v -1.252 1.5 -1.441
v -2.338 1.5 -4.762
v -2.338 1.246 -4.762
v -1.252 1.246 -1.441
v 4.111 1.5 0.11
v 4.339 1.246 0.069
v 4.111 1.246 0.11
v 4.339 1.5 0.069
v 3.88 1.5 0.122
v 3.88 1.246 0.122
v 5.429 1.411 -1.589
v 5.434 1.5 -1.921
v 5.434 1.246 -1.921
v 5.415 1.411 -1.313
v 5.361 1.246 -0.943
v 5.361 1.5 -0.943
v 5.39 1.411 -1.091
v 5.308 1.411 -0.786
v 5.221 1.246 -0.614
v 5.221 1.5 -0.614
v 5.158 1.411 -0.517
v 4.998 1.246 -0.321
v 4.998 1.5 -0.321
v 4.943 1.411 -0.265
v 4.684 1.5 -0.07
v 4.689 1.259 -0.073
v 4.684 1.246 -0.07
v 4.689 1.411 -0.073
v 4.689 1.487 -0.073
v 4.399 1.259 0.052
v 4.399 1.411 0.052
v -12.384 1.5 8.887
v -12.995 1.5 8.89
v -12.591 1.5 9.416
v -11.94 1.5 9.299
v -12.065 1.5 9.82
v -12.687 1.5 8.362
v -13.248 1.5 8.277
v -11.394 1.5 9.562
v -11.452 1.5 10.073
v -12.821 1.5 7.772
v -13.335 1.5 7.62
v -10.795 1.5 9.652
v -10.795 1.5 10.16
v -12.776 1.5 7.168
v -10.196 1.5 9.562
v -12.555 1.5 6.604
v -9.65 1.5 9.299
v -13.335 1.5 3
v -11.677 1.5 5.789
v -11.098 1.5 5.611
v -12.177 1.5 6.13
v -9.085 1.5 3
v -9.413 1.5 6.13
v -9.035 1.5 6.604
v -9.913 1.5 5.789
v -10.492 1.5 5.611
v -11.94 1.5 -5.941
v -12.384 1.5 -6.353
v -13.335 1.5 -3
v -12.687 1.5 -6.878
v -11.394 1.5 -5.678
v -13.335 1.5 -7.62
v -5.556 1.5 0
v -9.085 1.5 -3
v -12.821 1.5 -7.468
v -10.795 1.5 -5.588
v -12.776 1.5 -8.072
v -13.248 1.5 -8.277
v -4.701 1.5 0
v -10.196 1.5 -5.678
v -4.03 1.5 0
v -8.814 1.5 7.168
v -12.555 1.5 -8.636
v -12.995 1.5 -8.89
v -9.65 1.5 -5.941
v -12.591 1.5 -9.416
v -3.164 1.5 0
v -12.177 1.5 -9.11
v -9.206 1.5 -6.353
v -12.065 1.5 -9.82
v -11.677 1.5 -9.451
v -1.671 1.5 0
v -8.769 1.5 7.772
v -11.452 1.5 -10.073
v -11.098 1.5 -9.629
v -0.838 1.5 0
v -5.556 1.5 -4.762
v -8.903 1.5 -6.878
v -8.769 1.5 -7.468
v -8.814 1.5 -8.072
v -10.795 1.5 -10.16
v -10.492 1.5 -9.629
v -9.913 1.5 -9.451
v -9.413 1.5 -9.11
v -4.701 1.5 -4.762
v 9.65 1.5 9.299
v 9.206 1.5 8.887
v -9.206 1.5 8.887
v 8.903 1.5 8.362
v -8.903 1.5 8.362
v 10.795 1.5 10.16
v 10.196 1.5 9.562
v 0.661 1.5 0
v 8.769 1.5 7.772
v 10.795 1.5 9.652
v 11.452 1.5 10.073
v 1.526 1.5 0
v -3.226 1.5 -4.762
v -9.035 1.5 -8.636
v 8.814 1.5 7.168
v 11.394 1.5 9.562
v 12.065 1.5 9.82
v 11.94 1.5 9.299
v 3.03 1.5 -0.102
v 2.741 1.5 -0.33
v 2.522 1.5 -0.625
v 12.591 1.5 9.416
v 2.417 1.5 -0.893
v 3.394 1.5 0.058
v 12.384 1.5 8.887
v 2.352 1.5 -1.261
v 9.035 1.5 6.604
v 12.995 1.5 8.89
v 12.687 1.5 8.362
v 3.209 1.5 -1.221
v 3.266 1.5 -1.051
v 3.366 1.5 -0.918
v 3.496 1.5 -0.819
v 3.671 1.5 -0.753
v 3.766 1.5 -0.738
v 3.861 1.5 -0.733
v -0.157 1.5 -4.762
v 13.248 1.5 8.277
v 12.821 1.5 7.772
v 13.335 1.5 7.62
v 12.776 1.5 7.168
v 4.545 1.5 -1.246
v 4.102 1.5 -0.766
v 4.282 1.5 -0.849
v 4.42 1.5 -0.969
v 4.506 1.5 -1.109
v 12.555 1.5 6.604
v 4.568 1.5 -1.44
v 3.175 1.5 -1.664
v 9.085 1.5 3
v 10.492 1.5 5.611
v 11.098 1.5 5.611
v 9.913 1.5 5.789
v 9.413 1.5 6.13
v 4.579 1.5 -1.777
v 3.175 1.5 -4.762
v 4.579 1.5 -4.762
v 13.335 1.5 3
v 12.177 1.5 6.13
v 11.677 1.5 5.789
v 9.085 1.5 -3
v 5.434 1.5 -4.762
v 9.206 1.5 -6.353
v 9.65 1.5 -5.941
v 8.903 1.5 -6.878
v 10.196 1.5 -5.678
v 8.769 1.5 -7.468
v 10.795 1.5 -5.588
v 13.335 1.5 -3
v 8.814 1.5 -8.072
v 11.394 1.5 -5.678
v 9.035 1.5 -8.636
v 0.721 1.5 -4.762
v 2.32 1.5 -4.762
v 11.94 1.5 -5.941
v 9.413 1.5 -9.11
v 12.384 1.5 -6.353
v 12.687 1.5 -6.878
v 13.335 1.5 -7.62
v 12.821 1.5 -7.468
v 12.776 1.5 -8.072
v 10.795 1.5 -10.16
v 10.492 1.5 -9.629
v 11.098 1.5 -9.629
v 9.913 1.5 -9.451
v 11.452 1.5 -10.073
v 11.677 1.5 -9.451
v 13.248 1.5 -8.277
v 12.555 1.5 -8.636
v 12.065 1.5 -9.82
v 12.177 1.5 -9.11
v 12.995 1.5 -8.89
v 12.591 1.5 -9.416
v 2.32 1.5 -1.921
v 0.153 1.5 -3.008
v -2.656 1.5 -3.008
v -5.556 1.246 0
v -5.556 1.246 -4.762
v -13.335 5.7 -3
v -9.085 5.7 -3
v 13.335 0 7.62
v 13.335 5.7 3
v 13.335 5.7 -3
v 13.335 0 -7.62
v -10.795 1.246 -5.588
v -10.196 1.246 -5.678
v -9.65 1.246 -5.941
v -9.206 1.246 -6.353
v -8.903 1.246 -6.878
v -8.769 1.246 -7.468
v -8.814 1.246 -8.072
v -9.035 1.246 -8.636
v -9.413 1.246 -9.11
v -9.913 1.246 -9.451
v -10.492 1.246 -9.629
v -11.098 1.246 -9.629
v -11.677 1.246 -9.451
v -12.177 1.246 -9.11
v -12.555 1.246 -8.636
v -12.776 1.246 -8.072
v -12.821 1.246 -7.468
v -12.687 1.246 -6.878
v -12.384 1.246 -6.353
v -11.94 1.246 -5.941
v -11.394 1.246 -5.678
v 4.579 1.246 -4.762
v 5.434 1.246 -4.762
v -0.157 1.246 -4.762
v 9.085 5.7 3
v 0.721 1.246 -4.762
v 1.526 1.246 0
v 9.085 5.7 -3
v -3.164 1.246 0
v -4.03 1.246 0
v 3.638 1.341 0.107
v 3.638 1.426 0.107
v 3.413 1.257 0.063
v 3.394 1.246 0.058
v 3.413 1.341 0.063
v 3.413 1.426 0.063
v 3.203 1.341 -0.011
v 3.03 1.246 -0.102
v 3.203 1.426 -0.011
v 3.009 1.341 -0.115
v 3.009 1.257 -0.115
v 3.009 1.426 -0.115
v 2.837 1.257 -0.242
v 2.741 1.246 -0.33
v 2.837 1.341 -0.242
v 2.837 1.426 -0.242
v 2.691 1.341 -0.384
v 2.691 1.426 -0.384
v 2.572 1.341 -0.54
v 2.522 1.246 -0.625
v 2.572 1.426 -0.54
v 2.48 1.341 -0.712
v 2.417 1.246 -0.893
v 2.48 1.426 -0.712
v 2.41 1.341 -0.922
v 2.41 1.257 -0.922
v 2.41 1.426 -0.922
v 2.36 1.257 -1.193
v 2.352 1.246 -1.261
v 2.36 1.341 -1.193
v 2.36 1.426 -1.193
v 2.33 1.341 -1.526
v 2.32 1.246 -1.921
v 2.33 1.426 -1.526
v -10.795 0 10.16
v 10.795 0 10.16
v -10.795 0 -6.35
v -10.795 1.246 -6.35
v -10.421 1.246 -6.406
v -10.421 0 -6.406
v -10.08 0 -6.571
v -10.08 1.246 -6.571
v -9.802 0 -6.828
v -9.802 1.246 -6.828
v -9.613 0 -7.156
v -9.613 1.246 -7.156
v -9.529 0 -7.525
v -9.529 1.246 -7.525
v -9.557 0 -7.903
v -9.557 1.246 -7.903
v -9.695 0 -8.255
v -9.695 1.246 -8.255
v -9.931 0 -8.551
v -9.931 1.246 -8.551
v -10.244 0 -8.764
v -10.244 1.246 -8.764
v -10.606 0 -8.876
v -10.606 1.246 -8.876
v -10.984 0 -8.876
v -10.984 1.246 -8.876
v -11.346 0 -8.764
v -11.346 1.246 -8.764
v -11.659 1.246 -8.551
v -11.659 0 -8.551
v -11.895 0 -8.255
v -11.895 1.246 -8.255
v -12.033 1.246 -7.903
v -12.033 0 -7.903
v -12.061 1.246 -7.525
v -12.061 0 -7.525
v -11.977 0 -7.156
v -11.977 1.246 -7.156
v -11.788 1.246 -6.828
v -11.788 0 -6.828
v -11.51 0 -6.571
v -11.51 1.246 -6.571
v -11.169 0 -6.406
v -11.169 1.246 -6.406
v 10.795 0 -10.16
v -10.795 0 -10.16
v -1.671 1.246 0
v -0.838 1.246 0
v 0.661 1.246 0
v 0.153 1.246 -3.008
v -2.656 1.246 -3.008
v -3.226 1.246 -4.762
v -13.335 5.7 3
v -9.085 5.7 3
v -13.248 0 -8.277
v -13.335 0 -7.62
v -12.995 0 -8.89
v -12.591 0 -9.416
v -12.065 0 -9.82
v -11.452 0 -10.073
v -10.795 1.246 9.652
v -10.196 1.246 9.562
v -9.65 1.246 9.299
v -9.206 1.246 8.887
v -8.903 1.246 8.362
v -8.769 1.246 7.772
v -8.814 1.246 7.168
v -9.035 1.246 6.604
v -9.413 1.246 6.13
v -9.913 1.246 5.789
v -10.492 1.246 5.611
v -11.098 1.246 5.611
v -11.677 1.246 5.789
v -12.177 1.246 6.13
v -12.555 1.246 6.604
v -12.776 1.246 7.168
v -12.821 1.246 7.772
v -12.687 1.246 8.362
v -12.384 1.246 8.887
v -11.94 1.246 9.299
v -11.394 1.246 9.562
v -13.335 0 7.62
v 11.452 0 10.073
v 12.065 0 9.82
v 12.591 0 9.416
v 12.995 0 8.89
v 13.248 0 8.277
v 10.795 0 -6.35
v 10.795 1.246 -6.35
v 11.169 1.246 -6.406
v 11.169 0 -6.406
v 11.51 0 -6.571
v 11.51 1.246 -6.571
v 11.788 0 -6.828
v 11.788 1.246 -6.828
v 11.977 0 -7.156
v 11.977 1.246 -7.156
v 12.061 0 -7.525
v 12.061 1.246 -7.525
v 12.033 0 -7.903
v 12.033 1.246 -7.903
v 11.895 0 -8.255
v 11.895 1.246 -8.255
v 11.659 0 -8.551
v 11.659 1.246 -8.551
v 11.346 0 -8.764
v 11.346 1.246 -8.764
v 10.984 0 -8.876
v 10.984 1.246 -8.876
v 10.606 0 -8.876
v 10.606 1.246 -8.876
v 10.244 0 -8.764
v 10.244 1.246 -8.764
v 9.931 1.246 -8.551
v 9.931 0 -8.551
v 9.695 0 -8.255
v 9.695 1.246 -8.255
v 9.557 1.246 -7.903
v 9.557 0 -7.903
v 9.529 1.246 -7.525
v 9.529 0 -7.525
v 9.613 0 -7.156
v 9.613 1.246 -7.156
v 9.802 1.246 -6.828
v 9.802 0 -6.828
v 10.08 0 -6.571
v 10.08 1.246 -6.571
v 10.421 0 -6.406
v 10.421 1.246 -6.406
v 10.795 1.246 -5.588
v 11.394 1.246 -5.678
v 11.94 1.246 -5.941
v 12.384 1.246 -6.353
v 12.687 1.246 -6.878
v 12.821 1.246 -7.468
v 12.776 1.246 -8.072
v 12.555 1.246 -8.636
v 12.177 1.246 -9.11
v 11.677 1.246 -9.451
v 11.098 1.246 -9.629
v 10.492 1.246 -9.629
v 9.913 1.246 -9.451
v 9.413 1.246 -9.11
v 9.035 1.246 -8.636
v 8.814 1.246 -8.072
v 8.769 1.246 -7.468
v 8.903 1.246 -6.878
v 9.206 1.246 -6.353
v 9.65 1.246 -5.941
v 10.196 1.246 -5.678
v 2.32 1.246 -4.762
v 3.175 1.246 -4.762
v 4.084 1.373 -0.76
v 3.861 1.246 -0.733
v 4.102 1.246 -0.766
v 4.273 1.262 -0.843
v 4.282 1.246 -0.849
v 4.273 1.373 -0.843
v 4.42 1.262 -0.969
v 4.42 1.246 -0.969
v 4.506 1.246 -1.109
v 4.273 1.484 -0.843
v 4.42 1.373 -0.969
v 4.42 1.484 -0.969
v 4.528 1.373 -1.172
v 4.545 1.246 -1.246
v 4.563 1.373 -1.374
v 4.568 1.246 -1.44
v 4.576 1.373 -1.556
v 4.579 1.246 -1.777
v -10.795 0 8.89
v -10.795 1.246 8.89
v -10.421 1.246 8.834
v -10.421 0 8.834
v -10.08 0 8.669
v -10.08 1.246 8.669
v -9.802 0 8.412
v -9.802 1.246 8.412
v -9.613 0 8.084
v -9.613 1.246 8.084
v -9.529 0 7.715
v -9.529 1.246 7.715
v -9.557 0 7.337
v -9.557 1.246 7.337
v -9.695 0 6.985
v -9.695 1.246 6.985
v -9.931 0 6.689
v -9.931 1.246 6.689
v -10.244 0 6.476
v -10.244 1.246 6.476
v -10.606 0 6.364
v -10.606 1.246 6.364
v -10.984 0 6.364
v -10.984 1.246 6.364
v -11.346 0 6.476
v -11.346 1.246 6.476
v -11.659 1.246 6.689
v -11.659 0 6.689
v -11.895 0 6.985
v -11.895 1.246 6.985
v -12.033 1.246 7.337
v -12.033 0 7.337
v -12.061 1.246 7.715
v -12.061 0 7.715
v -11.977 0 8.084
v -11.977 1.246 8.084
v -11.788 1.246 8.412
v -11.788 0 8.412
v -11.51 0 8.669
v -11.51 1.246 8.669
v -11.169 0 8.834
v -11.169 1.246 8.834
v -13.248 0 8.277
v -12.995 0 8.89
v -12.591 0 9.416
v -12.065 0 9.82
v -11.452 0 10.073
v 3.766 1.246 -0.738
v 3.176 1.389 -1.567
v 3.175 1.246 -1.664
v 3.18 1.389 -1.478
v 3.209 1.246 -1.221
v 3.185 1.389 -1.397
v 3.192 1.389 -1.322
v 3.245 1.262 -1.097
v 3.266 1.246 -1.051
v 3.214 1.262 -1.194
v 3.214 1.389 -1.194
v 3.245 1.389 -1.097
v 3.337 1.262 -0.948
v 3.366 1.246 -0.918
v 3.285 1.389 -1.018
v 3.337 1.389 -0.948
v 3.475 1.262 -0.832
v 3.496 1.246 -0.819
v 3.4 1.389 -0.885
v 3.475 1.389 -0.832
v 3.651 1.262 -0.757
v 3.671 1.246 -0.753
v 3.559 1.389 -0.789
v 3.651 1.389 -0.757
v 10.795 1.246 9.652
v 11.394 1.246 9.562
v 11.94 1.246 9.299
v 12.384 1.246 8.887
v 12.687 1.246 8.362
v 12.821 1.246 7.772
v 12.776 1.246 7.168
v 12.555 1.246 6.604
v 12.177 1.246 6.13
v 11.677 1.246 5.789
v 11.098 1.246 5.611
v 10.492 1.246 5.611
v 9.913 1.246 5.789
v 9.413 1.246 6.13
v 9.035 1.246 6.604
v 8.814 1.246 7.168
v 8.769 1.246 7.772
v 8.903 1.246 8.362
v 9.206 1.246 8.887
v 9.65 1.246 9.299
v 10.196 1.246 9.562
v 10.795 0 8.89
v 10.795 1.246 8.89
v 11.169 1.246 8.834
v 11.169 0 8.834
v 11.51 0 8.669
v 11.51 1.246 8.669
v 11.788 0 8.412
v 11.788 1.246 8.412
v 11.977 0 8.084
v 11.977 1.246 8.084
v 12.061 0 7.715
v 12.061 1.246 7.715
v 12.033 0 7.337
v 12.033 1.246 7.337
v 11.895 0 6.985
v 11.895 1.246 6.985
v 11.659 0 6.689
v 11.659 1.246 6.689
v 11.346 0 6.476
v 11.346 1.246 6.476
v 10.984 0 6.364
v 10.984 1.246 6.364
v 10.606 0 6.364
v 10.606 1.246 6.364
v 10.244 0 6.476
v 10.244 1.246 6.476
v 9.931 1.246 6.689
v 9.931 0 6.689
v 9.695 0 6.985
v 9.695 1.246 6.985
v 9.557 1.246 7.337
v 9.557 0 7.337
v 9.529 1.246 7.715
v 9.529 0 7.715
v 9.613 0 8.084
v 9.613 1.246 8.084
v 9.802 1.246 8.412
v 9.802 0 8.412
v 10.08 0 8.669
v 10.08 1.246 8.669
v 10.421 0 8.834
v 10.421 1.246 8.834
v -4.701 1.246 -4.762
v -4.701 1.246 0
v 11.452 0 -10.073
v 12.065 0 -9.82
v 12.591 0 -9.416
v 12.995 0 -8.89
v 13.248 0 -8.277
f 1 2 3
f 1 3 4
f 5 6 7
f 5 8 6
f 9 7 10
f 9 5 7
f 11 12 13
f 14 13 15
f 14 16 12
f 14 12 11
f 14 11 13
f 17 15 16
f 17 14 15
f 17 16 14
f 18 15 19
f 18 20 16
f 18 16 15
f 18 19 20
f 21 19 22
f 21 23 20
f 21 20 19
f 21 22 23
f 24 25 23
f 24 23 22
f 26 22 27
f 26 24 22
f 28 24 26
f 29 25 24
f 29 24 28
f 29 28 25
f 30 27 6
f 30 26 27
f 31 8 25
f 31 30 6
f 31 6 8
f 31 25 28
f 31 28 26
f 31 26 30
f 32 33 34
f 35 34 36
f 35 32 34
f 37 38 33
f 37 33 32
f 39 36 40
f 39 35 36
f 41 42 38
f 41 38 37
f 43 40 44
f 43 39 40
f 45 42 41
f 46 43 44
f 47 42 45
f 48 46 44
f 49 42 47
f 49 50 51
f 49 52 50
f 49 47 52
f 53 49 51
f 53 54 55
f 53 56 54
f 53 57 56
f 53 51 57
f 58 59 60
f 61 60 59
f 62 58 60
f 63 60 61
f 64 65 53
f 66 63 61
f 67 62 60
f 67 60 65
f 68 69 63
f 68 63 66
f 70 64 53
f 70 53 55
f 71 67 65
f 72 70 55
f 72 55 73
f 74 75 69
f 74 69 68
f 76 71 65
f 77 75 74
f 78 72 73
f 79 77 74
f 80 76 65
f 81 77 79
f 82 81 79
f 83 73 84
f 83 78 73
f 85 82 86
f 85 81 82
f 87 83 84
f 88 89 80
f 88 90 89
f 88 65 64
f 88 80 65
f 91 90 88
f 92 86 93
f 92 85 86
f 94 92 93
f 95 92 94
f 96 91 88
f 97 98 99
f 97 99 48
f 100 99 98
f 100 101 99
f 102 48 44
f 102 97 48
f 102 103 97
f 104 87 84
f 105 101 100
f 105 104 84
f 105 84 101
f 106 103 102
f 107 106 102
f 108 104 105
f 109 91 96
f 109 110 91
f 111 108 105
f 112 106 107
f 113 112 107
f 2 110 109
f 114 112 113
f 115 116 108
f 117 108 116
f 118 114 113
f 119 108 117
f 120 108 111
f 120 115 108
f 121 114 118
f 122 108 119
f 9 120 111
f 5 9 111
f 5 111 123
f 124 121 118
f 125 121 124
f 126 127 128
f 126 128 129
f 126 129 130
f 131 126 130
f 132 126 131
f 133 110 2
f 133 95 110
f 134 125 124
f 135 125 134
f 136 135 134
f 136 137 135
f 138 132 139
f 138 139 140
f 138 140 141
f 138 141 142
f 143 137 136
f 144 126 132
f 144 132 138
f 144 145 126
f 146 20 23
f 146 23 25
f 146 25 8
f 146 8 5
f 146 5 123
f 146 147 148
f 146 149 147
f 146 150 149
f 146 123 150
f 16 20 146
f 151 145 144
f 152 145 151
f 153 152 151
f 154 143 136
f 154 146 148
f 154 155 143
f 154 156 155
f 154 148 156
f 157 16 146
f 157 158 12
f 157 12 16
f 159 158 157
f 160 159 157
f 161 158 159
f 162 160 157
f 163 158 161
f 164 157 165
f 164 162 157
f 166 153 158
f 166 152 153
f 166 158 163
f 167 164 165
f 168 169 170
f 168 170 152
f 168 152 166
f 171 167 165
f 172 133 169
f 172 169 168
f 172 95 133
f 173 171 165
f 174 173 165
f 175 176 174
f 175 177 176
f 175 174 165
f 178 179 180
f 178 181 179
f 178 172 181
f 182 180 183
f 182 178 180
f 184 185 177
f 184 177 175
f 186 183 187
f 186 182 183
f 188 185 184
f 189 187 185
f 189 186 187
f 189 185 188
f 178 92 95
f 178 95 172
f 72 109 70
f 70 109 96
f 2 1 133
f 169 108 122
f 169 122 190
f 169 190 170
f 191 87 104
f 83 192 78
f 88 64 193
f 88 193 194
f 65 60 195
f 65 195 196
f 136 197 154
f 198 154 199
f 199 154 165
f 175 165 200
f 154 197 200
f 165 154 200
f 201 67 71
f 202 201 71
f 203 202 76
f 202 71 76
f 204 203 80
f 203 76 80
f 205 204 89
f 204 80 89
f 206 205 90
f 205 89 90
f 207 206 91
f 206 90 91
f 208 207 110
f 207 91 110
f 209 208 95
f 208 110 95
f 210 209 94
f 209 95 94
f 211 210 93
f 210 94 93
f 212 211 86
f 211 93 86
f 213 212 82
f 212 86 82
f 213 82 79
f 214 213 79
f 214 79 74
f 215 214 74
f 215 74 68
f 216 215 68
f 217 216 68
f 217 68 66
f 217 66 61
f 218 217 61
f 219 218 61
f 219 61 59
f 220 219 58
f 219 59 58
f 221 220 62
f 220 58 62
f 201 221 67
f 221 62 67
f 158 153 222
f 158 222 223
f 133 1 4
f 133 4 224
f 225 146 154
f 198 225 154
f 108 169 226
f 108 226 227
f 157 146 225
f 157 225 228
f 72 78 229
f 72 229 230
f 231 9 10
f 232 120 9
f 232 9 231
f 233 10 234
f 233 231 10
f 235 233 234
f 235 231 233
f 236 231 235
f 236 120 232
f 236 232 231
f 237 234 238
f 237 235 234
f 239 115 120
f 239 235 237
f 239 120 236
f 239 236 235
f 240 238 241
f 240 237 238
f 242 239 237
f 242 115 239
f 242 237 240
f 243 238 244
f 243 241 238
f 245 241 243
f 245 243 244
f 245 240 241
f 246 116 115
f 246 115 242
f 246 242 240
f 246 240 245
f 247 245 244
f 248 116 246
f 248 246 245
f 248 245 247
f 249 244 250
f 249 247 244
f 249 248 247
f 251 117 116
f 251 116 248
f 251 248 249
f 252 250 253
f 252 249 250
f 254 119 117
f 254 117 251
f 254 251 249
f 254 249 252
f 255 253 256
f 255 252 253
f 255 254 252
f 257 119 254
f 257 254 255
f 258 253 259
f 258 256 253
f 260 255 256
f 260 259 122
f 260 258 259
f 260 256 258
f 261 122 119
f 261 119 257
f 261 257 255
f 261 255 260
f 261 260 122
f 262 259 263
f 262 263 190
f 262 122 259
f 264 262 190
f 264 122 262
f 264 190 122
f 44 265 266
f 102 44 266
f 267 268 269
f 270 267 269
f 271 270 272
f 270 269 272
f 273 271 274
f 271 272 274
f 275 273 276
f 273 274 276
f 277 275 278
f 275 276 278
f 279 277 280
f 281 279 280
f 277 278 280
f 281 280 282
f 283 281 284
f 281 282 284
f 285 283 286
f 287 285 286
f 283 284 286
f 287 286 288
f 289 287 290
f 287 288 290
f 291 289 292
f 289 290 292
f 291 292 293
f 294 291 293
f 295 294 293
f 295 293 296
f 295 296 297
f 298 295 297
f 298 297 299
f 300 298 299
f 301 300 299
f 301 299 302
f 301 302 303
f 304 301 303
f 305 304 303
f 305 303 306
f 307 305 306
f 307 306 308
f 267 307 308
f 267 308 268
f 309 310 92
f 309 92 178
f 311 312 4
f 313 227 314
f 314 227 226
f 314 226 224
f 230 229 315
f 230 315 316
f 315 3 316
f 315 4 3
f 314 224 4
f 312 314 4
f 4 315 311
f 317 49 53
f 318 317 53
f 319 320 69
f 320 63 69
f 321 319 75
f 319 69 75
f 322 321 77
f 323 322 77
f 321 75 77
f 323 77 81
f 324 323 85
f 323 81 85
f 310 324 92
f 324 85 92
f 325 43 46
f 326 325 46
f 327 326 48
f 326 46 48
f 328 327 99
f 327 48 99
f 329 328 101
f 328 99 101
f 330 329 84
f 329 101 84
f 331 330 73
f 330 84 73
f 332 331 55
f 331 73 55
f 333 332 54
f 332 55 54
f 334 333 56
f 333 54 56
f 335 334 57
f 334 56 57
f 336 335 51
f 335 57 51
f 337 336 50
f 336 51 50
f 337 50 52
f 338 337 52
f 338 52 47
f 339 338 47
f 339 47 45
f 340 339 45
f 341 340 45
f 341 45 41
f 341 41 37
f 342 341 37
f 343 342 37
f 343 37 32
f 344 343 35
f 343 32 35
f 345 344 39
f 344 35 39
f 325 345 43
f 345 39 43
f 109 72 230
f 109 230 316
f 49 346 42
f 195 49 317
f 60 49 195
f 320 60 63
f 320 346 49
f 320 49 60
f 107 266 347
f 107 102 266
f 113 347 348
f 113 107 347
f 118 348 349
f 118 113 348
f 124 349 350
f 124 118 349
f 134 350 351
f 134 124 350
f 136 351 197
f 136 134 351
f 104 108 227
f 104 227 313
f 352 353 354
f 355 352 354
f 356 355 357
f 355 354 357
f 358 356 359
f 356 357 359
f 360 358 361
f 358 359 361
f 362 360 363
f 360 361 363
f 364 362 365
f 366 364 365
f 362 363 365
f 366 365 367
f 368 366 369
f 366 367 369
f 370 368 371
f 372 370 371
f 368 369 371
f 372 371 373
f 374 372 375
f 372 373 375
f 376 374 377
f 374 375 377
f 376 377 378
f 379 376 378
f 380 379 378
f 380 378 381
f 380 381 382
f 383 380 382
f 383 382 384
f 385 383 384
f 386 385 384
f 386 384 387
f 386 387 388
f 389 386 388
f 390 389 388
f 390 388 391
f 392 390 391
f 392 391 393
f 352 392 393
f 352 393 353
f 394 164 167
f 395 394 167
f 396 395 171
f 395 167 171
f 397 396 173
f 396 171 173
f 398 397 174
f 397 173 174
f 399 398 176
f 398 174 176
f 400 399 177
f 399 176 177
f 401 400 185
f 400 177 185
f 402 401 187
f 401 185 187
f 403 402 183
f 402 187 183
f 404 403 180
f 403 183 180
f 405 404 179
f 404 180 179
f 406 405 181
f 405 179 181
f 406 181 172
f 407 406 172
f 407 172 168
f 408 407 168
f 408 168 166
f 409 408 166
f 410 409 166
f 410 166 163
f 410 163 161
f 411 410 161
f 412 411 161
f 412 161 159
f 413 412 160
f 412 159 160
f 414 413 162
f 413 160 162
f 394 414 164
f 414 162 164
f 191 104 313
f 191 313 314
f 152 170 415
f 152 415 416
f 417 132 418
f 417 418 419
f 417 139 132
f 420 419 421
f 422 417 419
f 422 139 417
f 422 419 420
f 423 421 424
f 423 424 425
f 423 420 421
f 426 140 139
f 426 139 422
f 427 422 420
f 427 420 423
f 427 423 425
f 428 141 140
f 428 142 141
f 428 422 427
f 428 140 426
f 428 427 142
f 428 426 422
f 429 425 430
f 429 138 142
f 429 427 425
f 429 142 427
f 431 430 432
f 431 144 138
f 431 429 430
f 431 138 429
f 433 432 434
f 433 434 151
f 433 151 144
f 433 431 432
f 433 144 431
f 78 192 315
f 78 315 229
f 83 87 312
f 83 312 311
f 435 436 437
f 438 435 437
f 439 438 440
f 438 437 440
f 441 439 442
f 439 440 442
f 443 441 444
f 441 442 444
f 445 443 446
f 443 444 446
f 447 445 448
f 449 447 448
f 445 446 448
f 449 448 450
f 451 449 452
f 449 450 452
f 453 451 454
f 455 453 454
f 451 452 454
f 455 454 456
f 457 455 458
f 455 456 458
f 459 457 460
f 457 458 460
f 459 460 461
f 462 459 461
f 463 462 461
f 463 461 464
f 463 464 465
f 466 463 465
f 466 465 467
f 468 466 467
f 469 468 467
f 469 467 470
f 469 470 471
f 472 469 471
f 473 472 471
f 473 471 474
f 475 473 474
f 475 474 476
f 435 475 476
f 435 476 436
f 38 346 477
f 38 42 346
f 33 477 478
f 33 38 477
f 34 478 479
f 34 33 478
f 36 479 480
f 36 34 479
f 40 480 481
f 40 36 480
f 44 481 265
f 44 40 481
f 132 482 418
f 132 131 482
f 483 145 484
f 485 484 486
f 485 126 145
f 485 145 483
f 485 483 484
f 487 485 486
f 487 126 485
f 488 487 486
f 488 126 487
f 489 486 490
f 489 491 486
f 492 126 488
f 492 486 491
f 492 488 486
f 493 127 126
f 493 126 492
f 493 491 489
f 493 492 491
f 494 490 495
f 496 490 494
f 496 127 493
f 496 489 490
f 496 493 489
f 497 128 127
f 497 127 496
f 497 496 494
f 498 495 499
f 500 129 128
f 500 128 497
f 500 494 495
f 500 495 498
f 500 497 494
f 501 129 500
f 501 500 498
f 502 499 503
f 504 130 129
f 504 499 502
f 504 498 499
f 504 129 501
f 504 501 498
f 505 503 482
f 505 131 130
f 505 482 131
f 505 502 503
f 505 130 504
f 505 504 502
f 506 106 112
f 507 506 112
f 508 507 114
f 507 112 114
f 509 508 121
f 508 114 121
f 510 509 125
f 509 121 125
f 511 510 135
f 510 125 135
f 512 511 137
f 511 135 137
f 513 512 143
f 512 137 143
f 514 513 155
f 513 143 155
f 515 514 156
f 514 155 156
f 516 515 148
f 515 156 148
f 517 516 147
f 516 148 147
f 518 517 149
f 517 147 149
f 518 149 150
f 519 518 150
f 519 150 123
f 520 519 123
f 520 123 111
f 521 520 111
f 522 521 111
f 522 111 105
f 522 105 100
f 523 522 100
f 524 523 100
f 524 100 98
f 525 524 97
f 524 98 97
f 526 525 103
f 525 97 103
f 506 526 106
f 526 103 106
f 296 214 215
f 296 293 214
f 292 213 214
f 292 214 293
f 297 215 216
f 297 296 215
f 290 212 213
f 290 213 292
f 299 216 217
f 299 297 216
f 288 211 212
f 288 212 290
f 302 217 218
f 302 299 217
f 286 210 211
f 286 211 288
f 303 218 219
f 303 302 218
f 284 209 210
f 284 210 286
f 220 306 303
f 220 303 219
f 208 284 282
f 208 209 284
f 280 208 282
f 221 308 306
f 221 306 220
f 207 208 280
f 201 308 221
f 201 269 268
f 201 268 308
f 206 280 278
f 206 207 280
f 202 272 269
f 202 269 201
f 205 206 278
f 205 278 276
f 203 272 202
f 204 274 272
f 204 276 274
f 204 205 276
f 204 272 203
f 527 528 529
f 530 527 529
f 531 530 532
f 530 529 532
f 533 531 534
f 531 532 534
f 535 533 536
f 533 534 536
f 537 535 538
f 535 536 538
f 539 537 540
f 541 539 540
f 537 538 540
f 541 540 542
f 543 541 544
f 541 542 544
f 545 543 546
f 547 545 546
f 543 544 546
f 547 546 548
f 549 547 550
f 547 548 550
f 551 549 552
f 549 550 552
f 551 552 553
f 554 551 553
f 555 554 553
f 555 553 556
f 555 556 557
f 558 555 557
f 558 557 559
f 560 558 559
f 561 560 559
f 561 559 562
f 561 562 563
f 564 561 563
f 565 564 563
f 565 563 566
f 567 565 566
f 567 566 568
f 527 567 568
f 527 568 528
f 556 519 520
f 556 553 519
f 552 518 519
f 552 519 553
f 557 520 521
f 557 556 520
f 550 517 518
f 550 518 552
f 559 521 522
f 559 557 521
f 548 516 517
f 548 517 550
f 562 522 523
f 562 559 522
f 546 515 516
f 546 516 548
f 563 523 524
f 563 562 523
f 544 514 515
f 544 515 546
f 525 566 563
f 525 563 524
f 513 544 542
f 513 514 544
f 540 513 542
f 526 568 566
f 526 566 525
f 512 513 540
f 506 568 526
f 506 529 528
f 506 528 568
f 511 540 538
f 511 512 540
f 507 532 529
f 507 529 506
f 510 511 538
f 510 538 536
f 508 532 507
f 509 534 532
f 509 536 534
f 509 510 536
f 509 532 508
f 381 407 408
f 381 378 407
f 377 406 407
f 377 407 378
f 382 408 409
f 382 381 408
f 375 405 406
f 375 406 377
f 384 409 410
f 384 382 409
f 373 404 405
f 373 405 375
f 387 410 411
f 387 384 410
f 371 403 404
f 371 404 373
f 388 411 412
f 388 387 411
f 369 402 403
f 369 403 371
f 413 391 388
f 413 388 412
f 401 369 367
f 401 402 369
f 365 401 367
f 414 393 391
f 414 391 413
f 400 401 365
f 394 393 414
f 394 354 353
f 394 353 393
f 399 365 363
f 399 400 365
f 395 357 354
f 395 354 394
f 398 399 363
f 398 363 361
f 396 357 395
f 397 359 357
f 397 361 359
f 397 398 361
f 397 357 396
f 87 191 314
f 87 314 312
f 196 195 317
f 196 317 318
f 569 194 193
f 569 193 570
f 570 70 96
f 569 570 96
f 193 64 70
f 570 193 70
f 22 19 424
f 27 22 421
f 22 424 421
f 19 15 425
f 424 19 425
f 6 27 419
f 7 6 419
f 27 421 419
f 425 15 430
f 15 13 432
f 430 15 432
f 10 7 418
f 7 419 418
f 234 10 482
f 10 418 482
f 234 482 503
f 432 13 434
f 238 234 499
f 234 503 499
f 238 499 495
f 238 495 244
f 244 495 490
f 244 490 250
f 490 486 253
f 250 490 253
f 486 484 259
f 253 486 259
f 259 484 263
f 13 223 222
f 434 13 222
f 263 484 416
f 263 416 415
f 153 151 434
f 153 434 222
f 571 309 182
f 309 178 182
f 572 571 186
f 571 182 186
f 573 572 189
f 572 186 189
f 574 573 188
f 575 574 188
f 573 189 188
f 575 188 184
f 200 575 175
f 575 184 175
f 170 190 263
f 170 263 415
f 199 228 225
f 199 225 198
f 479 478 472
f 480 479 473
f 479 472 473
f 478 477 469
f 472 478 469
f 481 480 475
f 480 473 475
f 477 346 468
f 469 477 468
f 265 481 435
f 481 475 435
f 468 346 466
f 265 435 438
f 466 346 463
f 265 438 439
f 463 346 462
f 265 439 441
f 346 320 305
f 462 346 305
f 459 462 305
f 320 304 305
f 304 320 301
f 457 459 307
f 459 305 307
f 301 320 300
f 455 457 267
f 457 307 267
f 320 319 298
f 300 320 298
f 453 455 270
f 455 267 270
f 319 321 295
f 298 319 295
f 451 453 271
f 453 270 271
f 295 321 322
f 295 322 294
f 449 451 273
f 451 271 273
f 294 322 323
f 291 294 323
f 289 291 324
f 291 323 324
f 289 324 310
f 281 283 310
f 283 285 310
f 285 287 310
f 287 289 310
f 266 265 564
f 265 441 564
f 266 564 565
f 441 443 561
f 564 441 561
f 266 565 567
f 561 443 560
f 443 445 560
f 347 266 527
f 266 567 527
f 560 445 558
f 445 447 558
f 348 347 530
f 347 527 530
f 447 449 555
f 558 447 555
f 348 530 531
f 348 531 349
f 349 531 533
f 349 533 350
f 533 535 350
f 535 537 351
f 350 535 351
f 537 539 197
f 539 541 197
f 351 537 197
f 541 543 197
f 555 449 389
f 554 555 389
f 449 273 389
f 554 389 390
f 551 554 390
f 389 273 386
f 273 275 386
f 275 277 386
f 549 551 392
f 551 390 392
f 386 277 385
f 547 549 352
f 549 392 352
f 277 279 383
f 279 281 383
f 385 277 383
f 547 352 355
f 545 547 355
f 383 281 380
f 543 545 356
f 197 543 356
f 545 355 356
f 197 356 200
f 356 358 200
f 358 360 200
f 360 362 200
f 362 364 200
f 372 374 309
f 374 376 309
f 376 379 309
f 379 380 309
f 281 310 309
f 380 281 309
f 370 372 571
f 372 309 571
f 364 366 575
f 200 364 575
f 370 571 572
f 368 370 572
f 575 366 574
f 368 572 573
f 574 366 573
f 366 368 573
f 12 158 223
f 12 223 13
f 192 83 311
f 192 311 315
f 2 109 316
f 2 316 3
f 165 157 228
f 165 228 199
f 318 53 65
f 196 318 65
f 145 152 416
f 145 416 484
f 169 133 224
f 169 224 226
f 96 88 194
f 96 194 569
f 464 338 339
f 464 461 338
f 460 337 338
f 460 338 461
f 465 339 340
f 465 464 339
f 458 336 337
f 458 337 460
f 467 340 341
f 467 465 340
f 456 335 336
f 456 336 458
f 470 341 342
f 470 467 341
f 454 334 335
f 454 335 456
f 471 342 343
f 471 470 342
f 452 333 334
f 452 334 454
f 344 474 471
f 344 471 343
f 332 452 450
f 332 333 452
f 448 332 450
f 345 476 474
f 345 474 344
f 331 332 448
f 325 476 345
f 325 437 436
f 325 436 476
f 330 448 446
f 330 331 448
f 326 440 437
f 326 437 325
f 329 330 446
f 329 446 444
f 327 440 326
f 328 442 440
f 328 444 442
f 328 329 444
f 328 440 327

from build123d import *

# Parameters (mm, degrees)
SKETCH1_W           = 26.67
SKETCH1_H           = 20.32
BOSS_EXTRUDE1_DEPTH = 1.5
SKETCH2_R           = 1.27
CUT_EXTRUDE1_DEPTH  = 17.831453443
FILLET1_R           = 2.54
SKETCH3_W           = 0.854807692
SKETCH3_H           = 4.7625
CUT_EXTRUDE2_DEPTH  = 0.254
SKETCH4_R           = 2.032
SKETCH4_R_2         = 1.27
CUT_EXTRUDE3_DEPTH  = 0.254
SKETCH5_W           = 4.25
SKETCH5_H           = 6
BOSS_EXTRUDE3_DEPTH = 4.2


with BuildPart() as part:
    # Sketch1 → Boss-Extrude1 (new body)
    with BuildSketch(Plane(origin=(0, 0, 0), x_dir=(1, 0, 0), z_dir=(0, 1, 0))):
        Rectangle(SKETCH1_W, SKETCH1_H)
    extrude(amount=BOSS_EXTRUDE1_DEPTH)

    # Sketch2 → Cut-Extrude1 (cut, through all)
    with BuildSketch(Plane(origin=(0, 1.5, 0), x_dir=(1, 0, 0), z_dir=(0, 1, 0))):
        with Locations(Location((10.795, 7.62, 0), (0, 0, 270))):
            Circle(SKETCH2_R)
        with Locations(Location((-10.795, 7.62, 0), (0, 0, 270))):
            Circle(SKETCH2_R)
        with Locations(Location((-10.795, -7.62, 0), (0, 0, 270))):
            Circle(SKETCH2_R)
        with Locations(Location((10.795, -7.62, 0), (0, 0, 270))):
            Circle(SKETCH2_R)
    extrude(amount=-CUT_EXTRUDE1_DEPTH, mode=Mode.SUBTRACT)

    # Fillet1
    fillet1_edges = [part.edges().sort_by_distance(p)[0] for p in [
        (13.335, 0.75, 10.16),
        (-13.335, 0.75, 10.16),
        (-13.335, 0.75, -10.16),
        (13.335, 0.75, -10.16),
    ]]
    fillet(fillet1_edges, radius=FILLET1_R)

    # Sketch3 → Cut-Extrude2 (cut)
    with BuildSketch(Plane(origin=(0, 1.5, 0), x_dir=(1, 0, 0), z_dir=(0, 1, 0))):
        with Locations((-5.128846154, 2.38125)):
            Rectangle(SKETCH3_W, SKETCH3_H)
        Polygon((-3.225563401, 4.7625), (-2.33831881, 4.7625), (-1.251682692, 1.440579928), (-0.157414363, 4.7625), (0.72124399, 4.7625), (1.526442308, 0), (0.661140325, 0), (0.152644231, 3.008045373), (-0.837635216, 0), (-1.671454327, 0), (-2.656009615, 3.008045373), (-3.163551683, 0), (-4.029807692, 0), align=None)
        with BuildLine():
            Line((2.320192308, 4.7625), (3.175, 4.7625))
            Line((3.175, 4.7625), (3.175, 1.663822115))
            add(Edge.make_bspline(
                [(3.175, 1.663822115), (3.17504648, 1.631696367), (3.175136256, 1.569645816), (3.179630493, 1.480623591), (3.18374303, 1.398793527), (3.191163214, 1.32424521), (3.202125369, 1.256946752), (3.212740313, 1.19646585), (3.227106588, 1.143885348), (3.248696804, 1.08403497), (3.281960239, 1.016789802), (3.336310846, 0.946705344), (3.399026797, 0.882743105), (3.474195476, 0.82950336), (3.558678424, 0.786437205), (3.652011444, 0.75452995), (3.75406297, 0.736793753), (3.824626003, 0.734085998), (3.860945012, 0.732692308)],
                knots=[0, 0, 0, 0, 1.155499968, 2.231836252, 3.205919964, 4.102923608, 4.924856345, 5.658536265, 6.31071849, 6.882491295, 7.94666036, 8.992281882, 10.060072772, 11.158554251, 12.289267114, 13.461410017, 14.693379945, 16, 16, 16, 16], degree=3))
            add(Edge.make_bspline(
                [(3.860945012, 0.732692308), (3.899529477, 0.73381823), (3.974762653, 0.736013589), (4.082973598, 0.757563409), (4.183231653, 0.791878102), (4.273414012, 0.840853915), (4.353430929, 0.89956001), (4.421163572, 0.966503355), (4.474617926, 1.041817469), (4.509457485, 1.111300474), (4.529018182, 1.17525353), (4.543679898, 1.232393158), (4.554428558, 1.299812263), (4.564180096, 1.376457951), (4.570040019, 1.463124123), (4.57639415, 1.559113798), (4.578722998, 1.665083764), (4.579119934, 1.73887264), (4.579326923, 1.777351262)],
                knots=[0, 0, 0, 0, 1.261321664, 2.459363699, 3.594844139, 4.716940403, 5.803436589, 6.833651888, 7.818396249, 8.814403945, 9.360733334, 10.004355033, 10.743453831, 11.592799886, 12.532235708, 13.585170094, 14.740740724, 16, 16, 16, 16], degree=3))
            Line((4.579326923, 1.777351262), (4.579326923, 4.7625))
            Line((4.579326923, 4.7625), (5.434134615, 4.7625))
            Line((5.434134615, 4.7625), (5.434134615, 1.921409255))
            add(Edge.make_bspline(
                [(5.434134615, 1.921409255), (5.43401591, 1.863848892), (5.433787651, 1.753165928), (5.430282276, 1.59410672), (5.422819969, 1.448831648), (5.416552491, 1.317298262), (5.404422776, 1.199683761), (5.391786458, 1.095485896), (5.375680384, 1.00507392), (5.351715514, 0.902150874), (5.310359243, 0.783638756), (5.243687513, 0.647177189), (5.159052066, 0.513573049), (5.059017198, 0.384296074), (4.946068681, 0.26420193), (4.822710827, 0.158774817), (4.690903483, 0.069594847), (4.549269359, -0.00115742), (4.397928993, -0.056338855), (4.235384983, -0.093418), (4.061748173, -0.118469136), (3.941813946, -0.120875606), (3.880025541, -0.122115385)],
                knots=[0, 0, 0, 0, 1.170808336, 2.251350247, 3.235597562, 4.129743112, 4.929140599, 5.639994148, 6.264258765, 6.79612947, 7.788252245, 8.809469599, 9.879094798, 10.999557536, 12.129761673, 13.226370002, 14.293821979, 15.358369427, 16.438775801, 17.562147481, 18.744053101, 20, 20, 20, 20], degree=3))
            add(Edge.make_bspline(
                [(3.880025541, -0.122115385), (3.838972095, -0.121423894), (3.757974489, -0.120059596), (3.638853299, -0.108030054), (3.523699269, -0.090303032), (3.412728772, -0.064441133), (3.305556652, -0.031032389), (3.20221138, 0.010091447), (3.103077013, 0.058700993), (3.008708293, 0.114349146), (2.919221348, 0.174523044), (2.8374349, 0.241228342), (2.760534484, 0.309531933), (2.690741722, 0.382308322), (2.627532409, 0.458793479), (2.571036723, 0.539160746), (2.521338598, 0.623402985), (2.477187905, 0.713038656), (2.439399222, 0.812623617), (2.407541942, 0.925700146), (2.379710672, 1.054040605), (2.359028115, 1.197934139), (2.340277187, 1.356906489), (2.328408884, 1.531371804), (2.32220004, 1.721335089), (2.320878462, 1.853032696), (2.320192308, 1.921409255)],
                knots=[0, 0, 0, 0, 1.001158378, 1.975264943, 2.917723546, 3.841610987, 4.75185031, 5.653588123, 6.552117133, 7.442167995, 8.324307438, 9.179605724, 10.014504199, 10.831958861, 11.636465792, 12.43274043, 13.225645099, 14.020104002, 14.867201867, 15.819789774, 16.883317127, 18.068162734, 19.364263498, 20.787406516, 22.332041935, 24, 24, 24, 24], degree=3))
            Line((2.320192308, 1.921409255), (2.320192308, 4.7625))
        make_face()
    extrude(amount=-CUT_EXTRUDE2_DEPTH, mode=Mode.SUBTRACT)

    # Sketch4 → Cut-Extrude3 (cut)
    # profile 1 of 4: a face of its own
    with BuildSketch(Plane(origin=(0, 1.5, 0), x_dir=(1, 0, 0), z_dir=(0, 1, 0))):
        with Locations(Location((-10.795, 7.62, 0), (0, 0, 270))):
            Circle(SKETCH4_R)
        with Locations(Location((-10.795, 7.62, 0), (0, 0, 270))):
            Circle(SKETCH4_R_2, mode=Mode.SUBTRACT)
    # profile 2 of 4: a face of its own
    with BuildSketch(Plane(origin=(0, 1.5, 0), x_dir=(1, 0, 0), z_dir=(0, 1, 0))):
        with Locations(Location((10.795, 7.62, 0), (0, 0, 270))):
            Circle(SKETCH4_R)
        with Locations(Location((10.795, 7.62, 0), (0, 0, 270))):
            Circle(SKETCH4_R_2, mode=Mode.SUBTRACT)
    # profile 3 of 4: a face of its own
    with BuildSketch(Plane(origin=(0, 1.5, 0), x_dir=(1, 0, 0), z_dir=(0, 1, 0))):
        with Locations(Location((10.795, -7.62, 0), (0, 0, 270))):
            Circle(SKETCH4_R)
        with Locations(Location((10.795, -7.62, 0), (0, 0, 270))):
            Circle(SKETCH4_R_2, mode=Mode.SUBTRACT)
    # profile 4 of 4: a face of its own
    with BuildSketch(Plane(origin=(0, 1.5, 0), x_dir=(1, 0, 0), z_dir=(0, 1, 0))):
        with Locations(Location((-10.795, -7.62, 0), (0, 0, 270))):
            Circle(SKETCH4_R)
        with Locations(Location((-10.795, -7.62, 0), (0, 0, 270))):
            Circle(SKETCH4_R_2, mode=Mode.SUBTRACT)
    extrude(amount=-CUT_EXTRUDE3_DEPTH, mode=Mode.SUBTRACT)

    # Sketch5 → Boss-Extrude3 (add)
    with BuildSketch(Plane(origin=(0, 1.5, 0), x_dir=(1, 0, 0), z_dir=(0, 1, 0))):
        with Locations((-11.21, 0)):
            Rectangle(SKETCH5_W, SKETCH5_H)
        with Locations((11.21, 0)):
            Rectangle(SKETCH5_W, SKETCH5_H)
    extrude(amount=BOSS_EXTRUDE3_DEPTH)


solid = part.part
